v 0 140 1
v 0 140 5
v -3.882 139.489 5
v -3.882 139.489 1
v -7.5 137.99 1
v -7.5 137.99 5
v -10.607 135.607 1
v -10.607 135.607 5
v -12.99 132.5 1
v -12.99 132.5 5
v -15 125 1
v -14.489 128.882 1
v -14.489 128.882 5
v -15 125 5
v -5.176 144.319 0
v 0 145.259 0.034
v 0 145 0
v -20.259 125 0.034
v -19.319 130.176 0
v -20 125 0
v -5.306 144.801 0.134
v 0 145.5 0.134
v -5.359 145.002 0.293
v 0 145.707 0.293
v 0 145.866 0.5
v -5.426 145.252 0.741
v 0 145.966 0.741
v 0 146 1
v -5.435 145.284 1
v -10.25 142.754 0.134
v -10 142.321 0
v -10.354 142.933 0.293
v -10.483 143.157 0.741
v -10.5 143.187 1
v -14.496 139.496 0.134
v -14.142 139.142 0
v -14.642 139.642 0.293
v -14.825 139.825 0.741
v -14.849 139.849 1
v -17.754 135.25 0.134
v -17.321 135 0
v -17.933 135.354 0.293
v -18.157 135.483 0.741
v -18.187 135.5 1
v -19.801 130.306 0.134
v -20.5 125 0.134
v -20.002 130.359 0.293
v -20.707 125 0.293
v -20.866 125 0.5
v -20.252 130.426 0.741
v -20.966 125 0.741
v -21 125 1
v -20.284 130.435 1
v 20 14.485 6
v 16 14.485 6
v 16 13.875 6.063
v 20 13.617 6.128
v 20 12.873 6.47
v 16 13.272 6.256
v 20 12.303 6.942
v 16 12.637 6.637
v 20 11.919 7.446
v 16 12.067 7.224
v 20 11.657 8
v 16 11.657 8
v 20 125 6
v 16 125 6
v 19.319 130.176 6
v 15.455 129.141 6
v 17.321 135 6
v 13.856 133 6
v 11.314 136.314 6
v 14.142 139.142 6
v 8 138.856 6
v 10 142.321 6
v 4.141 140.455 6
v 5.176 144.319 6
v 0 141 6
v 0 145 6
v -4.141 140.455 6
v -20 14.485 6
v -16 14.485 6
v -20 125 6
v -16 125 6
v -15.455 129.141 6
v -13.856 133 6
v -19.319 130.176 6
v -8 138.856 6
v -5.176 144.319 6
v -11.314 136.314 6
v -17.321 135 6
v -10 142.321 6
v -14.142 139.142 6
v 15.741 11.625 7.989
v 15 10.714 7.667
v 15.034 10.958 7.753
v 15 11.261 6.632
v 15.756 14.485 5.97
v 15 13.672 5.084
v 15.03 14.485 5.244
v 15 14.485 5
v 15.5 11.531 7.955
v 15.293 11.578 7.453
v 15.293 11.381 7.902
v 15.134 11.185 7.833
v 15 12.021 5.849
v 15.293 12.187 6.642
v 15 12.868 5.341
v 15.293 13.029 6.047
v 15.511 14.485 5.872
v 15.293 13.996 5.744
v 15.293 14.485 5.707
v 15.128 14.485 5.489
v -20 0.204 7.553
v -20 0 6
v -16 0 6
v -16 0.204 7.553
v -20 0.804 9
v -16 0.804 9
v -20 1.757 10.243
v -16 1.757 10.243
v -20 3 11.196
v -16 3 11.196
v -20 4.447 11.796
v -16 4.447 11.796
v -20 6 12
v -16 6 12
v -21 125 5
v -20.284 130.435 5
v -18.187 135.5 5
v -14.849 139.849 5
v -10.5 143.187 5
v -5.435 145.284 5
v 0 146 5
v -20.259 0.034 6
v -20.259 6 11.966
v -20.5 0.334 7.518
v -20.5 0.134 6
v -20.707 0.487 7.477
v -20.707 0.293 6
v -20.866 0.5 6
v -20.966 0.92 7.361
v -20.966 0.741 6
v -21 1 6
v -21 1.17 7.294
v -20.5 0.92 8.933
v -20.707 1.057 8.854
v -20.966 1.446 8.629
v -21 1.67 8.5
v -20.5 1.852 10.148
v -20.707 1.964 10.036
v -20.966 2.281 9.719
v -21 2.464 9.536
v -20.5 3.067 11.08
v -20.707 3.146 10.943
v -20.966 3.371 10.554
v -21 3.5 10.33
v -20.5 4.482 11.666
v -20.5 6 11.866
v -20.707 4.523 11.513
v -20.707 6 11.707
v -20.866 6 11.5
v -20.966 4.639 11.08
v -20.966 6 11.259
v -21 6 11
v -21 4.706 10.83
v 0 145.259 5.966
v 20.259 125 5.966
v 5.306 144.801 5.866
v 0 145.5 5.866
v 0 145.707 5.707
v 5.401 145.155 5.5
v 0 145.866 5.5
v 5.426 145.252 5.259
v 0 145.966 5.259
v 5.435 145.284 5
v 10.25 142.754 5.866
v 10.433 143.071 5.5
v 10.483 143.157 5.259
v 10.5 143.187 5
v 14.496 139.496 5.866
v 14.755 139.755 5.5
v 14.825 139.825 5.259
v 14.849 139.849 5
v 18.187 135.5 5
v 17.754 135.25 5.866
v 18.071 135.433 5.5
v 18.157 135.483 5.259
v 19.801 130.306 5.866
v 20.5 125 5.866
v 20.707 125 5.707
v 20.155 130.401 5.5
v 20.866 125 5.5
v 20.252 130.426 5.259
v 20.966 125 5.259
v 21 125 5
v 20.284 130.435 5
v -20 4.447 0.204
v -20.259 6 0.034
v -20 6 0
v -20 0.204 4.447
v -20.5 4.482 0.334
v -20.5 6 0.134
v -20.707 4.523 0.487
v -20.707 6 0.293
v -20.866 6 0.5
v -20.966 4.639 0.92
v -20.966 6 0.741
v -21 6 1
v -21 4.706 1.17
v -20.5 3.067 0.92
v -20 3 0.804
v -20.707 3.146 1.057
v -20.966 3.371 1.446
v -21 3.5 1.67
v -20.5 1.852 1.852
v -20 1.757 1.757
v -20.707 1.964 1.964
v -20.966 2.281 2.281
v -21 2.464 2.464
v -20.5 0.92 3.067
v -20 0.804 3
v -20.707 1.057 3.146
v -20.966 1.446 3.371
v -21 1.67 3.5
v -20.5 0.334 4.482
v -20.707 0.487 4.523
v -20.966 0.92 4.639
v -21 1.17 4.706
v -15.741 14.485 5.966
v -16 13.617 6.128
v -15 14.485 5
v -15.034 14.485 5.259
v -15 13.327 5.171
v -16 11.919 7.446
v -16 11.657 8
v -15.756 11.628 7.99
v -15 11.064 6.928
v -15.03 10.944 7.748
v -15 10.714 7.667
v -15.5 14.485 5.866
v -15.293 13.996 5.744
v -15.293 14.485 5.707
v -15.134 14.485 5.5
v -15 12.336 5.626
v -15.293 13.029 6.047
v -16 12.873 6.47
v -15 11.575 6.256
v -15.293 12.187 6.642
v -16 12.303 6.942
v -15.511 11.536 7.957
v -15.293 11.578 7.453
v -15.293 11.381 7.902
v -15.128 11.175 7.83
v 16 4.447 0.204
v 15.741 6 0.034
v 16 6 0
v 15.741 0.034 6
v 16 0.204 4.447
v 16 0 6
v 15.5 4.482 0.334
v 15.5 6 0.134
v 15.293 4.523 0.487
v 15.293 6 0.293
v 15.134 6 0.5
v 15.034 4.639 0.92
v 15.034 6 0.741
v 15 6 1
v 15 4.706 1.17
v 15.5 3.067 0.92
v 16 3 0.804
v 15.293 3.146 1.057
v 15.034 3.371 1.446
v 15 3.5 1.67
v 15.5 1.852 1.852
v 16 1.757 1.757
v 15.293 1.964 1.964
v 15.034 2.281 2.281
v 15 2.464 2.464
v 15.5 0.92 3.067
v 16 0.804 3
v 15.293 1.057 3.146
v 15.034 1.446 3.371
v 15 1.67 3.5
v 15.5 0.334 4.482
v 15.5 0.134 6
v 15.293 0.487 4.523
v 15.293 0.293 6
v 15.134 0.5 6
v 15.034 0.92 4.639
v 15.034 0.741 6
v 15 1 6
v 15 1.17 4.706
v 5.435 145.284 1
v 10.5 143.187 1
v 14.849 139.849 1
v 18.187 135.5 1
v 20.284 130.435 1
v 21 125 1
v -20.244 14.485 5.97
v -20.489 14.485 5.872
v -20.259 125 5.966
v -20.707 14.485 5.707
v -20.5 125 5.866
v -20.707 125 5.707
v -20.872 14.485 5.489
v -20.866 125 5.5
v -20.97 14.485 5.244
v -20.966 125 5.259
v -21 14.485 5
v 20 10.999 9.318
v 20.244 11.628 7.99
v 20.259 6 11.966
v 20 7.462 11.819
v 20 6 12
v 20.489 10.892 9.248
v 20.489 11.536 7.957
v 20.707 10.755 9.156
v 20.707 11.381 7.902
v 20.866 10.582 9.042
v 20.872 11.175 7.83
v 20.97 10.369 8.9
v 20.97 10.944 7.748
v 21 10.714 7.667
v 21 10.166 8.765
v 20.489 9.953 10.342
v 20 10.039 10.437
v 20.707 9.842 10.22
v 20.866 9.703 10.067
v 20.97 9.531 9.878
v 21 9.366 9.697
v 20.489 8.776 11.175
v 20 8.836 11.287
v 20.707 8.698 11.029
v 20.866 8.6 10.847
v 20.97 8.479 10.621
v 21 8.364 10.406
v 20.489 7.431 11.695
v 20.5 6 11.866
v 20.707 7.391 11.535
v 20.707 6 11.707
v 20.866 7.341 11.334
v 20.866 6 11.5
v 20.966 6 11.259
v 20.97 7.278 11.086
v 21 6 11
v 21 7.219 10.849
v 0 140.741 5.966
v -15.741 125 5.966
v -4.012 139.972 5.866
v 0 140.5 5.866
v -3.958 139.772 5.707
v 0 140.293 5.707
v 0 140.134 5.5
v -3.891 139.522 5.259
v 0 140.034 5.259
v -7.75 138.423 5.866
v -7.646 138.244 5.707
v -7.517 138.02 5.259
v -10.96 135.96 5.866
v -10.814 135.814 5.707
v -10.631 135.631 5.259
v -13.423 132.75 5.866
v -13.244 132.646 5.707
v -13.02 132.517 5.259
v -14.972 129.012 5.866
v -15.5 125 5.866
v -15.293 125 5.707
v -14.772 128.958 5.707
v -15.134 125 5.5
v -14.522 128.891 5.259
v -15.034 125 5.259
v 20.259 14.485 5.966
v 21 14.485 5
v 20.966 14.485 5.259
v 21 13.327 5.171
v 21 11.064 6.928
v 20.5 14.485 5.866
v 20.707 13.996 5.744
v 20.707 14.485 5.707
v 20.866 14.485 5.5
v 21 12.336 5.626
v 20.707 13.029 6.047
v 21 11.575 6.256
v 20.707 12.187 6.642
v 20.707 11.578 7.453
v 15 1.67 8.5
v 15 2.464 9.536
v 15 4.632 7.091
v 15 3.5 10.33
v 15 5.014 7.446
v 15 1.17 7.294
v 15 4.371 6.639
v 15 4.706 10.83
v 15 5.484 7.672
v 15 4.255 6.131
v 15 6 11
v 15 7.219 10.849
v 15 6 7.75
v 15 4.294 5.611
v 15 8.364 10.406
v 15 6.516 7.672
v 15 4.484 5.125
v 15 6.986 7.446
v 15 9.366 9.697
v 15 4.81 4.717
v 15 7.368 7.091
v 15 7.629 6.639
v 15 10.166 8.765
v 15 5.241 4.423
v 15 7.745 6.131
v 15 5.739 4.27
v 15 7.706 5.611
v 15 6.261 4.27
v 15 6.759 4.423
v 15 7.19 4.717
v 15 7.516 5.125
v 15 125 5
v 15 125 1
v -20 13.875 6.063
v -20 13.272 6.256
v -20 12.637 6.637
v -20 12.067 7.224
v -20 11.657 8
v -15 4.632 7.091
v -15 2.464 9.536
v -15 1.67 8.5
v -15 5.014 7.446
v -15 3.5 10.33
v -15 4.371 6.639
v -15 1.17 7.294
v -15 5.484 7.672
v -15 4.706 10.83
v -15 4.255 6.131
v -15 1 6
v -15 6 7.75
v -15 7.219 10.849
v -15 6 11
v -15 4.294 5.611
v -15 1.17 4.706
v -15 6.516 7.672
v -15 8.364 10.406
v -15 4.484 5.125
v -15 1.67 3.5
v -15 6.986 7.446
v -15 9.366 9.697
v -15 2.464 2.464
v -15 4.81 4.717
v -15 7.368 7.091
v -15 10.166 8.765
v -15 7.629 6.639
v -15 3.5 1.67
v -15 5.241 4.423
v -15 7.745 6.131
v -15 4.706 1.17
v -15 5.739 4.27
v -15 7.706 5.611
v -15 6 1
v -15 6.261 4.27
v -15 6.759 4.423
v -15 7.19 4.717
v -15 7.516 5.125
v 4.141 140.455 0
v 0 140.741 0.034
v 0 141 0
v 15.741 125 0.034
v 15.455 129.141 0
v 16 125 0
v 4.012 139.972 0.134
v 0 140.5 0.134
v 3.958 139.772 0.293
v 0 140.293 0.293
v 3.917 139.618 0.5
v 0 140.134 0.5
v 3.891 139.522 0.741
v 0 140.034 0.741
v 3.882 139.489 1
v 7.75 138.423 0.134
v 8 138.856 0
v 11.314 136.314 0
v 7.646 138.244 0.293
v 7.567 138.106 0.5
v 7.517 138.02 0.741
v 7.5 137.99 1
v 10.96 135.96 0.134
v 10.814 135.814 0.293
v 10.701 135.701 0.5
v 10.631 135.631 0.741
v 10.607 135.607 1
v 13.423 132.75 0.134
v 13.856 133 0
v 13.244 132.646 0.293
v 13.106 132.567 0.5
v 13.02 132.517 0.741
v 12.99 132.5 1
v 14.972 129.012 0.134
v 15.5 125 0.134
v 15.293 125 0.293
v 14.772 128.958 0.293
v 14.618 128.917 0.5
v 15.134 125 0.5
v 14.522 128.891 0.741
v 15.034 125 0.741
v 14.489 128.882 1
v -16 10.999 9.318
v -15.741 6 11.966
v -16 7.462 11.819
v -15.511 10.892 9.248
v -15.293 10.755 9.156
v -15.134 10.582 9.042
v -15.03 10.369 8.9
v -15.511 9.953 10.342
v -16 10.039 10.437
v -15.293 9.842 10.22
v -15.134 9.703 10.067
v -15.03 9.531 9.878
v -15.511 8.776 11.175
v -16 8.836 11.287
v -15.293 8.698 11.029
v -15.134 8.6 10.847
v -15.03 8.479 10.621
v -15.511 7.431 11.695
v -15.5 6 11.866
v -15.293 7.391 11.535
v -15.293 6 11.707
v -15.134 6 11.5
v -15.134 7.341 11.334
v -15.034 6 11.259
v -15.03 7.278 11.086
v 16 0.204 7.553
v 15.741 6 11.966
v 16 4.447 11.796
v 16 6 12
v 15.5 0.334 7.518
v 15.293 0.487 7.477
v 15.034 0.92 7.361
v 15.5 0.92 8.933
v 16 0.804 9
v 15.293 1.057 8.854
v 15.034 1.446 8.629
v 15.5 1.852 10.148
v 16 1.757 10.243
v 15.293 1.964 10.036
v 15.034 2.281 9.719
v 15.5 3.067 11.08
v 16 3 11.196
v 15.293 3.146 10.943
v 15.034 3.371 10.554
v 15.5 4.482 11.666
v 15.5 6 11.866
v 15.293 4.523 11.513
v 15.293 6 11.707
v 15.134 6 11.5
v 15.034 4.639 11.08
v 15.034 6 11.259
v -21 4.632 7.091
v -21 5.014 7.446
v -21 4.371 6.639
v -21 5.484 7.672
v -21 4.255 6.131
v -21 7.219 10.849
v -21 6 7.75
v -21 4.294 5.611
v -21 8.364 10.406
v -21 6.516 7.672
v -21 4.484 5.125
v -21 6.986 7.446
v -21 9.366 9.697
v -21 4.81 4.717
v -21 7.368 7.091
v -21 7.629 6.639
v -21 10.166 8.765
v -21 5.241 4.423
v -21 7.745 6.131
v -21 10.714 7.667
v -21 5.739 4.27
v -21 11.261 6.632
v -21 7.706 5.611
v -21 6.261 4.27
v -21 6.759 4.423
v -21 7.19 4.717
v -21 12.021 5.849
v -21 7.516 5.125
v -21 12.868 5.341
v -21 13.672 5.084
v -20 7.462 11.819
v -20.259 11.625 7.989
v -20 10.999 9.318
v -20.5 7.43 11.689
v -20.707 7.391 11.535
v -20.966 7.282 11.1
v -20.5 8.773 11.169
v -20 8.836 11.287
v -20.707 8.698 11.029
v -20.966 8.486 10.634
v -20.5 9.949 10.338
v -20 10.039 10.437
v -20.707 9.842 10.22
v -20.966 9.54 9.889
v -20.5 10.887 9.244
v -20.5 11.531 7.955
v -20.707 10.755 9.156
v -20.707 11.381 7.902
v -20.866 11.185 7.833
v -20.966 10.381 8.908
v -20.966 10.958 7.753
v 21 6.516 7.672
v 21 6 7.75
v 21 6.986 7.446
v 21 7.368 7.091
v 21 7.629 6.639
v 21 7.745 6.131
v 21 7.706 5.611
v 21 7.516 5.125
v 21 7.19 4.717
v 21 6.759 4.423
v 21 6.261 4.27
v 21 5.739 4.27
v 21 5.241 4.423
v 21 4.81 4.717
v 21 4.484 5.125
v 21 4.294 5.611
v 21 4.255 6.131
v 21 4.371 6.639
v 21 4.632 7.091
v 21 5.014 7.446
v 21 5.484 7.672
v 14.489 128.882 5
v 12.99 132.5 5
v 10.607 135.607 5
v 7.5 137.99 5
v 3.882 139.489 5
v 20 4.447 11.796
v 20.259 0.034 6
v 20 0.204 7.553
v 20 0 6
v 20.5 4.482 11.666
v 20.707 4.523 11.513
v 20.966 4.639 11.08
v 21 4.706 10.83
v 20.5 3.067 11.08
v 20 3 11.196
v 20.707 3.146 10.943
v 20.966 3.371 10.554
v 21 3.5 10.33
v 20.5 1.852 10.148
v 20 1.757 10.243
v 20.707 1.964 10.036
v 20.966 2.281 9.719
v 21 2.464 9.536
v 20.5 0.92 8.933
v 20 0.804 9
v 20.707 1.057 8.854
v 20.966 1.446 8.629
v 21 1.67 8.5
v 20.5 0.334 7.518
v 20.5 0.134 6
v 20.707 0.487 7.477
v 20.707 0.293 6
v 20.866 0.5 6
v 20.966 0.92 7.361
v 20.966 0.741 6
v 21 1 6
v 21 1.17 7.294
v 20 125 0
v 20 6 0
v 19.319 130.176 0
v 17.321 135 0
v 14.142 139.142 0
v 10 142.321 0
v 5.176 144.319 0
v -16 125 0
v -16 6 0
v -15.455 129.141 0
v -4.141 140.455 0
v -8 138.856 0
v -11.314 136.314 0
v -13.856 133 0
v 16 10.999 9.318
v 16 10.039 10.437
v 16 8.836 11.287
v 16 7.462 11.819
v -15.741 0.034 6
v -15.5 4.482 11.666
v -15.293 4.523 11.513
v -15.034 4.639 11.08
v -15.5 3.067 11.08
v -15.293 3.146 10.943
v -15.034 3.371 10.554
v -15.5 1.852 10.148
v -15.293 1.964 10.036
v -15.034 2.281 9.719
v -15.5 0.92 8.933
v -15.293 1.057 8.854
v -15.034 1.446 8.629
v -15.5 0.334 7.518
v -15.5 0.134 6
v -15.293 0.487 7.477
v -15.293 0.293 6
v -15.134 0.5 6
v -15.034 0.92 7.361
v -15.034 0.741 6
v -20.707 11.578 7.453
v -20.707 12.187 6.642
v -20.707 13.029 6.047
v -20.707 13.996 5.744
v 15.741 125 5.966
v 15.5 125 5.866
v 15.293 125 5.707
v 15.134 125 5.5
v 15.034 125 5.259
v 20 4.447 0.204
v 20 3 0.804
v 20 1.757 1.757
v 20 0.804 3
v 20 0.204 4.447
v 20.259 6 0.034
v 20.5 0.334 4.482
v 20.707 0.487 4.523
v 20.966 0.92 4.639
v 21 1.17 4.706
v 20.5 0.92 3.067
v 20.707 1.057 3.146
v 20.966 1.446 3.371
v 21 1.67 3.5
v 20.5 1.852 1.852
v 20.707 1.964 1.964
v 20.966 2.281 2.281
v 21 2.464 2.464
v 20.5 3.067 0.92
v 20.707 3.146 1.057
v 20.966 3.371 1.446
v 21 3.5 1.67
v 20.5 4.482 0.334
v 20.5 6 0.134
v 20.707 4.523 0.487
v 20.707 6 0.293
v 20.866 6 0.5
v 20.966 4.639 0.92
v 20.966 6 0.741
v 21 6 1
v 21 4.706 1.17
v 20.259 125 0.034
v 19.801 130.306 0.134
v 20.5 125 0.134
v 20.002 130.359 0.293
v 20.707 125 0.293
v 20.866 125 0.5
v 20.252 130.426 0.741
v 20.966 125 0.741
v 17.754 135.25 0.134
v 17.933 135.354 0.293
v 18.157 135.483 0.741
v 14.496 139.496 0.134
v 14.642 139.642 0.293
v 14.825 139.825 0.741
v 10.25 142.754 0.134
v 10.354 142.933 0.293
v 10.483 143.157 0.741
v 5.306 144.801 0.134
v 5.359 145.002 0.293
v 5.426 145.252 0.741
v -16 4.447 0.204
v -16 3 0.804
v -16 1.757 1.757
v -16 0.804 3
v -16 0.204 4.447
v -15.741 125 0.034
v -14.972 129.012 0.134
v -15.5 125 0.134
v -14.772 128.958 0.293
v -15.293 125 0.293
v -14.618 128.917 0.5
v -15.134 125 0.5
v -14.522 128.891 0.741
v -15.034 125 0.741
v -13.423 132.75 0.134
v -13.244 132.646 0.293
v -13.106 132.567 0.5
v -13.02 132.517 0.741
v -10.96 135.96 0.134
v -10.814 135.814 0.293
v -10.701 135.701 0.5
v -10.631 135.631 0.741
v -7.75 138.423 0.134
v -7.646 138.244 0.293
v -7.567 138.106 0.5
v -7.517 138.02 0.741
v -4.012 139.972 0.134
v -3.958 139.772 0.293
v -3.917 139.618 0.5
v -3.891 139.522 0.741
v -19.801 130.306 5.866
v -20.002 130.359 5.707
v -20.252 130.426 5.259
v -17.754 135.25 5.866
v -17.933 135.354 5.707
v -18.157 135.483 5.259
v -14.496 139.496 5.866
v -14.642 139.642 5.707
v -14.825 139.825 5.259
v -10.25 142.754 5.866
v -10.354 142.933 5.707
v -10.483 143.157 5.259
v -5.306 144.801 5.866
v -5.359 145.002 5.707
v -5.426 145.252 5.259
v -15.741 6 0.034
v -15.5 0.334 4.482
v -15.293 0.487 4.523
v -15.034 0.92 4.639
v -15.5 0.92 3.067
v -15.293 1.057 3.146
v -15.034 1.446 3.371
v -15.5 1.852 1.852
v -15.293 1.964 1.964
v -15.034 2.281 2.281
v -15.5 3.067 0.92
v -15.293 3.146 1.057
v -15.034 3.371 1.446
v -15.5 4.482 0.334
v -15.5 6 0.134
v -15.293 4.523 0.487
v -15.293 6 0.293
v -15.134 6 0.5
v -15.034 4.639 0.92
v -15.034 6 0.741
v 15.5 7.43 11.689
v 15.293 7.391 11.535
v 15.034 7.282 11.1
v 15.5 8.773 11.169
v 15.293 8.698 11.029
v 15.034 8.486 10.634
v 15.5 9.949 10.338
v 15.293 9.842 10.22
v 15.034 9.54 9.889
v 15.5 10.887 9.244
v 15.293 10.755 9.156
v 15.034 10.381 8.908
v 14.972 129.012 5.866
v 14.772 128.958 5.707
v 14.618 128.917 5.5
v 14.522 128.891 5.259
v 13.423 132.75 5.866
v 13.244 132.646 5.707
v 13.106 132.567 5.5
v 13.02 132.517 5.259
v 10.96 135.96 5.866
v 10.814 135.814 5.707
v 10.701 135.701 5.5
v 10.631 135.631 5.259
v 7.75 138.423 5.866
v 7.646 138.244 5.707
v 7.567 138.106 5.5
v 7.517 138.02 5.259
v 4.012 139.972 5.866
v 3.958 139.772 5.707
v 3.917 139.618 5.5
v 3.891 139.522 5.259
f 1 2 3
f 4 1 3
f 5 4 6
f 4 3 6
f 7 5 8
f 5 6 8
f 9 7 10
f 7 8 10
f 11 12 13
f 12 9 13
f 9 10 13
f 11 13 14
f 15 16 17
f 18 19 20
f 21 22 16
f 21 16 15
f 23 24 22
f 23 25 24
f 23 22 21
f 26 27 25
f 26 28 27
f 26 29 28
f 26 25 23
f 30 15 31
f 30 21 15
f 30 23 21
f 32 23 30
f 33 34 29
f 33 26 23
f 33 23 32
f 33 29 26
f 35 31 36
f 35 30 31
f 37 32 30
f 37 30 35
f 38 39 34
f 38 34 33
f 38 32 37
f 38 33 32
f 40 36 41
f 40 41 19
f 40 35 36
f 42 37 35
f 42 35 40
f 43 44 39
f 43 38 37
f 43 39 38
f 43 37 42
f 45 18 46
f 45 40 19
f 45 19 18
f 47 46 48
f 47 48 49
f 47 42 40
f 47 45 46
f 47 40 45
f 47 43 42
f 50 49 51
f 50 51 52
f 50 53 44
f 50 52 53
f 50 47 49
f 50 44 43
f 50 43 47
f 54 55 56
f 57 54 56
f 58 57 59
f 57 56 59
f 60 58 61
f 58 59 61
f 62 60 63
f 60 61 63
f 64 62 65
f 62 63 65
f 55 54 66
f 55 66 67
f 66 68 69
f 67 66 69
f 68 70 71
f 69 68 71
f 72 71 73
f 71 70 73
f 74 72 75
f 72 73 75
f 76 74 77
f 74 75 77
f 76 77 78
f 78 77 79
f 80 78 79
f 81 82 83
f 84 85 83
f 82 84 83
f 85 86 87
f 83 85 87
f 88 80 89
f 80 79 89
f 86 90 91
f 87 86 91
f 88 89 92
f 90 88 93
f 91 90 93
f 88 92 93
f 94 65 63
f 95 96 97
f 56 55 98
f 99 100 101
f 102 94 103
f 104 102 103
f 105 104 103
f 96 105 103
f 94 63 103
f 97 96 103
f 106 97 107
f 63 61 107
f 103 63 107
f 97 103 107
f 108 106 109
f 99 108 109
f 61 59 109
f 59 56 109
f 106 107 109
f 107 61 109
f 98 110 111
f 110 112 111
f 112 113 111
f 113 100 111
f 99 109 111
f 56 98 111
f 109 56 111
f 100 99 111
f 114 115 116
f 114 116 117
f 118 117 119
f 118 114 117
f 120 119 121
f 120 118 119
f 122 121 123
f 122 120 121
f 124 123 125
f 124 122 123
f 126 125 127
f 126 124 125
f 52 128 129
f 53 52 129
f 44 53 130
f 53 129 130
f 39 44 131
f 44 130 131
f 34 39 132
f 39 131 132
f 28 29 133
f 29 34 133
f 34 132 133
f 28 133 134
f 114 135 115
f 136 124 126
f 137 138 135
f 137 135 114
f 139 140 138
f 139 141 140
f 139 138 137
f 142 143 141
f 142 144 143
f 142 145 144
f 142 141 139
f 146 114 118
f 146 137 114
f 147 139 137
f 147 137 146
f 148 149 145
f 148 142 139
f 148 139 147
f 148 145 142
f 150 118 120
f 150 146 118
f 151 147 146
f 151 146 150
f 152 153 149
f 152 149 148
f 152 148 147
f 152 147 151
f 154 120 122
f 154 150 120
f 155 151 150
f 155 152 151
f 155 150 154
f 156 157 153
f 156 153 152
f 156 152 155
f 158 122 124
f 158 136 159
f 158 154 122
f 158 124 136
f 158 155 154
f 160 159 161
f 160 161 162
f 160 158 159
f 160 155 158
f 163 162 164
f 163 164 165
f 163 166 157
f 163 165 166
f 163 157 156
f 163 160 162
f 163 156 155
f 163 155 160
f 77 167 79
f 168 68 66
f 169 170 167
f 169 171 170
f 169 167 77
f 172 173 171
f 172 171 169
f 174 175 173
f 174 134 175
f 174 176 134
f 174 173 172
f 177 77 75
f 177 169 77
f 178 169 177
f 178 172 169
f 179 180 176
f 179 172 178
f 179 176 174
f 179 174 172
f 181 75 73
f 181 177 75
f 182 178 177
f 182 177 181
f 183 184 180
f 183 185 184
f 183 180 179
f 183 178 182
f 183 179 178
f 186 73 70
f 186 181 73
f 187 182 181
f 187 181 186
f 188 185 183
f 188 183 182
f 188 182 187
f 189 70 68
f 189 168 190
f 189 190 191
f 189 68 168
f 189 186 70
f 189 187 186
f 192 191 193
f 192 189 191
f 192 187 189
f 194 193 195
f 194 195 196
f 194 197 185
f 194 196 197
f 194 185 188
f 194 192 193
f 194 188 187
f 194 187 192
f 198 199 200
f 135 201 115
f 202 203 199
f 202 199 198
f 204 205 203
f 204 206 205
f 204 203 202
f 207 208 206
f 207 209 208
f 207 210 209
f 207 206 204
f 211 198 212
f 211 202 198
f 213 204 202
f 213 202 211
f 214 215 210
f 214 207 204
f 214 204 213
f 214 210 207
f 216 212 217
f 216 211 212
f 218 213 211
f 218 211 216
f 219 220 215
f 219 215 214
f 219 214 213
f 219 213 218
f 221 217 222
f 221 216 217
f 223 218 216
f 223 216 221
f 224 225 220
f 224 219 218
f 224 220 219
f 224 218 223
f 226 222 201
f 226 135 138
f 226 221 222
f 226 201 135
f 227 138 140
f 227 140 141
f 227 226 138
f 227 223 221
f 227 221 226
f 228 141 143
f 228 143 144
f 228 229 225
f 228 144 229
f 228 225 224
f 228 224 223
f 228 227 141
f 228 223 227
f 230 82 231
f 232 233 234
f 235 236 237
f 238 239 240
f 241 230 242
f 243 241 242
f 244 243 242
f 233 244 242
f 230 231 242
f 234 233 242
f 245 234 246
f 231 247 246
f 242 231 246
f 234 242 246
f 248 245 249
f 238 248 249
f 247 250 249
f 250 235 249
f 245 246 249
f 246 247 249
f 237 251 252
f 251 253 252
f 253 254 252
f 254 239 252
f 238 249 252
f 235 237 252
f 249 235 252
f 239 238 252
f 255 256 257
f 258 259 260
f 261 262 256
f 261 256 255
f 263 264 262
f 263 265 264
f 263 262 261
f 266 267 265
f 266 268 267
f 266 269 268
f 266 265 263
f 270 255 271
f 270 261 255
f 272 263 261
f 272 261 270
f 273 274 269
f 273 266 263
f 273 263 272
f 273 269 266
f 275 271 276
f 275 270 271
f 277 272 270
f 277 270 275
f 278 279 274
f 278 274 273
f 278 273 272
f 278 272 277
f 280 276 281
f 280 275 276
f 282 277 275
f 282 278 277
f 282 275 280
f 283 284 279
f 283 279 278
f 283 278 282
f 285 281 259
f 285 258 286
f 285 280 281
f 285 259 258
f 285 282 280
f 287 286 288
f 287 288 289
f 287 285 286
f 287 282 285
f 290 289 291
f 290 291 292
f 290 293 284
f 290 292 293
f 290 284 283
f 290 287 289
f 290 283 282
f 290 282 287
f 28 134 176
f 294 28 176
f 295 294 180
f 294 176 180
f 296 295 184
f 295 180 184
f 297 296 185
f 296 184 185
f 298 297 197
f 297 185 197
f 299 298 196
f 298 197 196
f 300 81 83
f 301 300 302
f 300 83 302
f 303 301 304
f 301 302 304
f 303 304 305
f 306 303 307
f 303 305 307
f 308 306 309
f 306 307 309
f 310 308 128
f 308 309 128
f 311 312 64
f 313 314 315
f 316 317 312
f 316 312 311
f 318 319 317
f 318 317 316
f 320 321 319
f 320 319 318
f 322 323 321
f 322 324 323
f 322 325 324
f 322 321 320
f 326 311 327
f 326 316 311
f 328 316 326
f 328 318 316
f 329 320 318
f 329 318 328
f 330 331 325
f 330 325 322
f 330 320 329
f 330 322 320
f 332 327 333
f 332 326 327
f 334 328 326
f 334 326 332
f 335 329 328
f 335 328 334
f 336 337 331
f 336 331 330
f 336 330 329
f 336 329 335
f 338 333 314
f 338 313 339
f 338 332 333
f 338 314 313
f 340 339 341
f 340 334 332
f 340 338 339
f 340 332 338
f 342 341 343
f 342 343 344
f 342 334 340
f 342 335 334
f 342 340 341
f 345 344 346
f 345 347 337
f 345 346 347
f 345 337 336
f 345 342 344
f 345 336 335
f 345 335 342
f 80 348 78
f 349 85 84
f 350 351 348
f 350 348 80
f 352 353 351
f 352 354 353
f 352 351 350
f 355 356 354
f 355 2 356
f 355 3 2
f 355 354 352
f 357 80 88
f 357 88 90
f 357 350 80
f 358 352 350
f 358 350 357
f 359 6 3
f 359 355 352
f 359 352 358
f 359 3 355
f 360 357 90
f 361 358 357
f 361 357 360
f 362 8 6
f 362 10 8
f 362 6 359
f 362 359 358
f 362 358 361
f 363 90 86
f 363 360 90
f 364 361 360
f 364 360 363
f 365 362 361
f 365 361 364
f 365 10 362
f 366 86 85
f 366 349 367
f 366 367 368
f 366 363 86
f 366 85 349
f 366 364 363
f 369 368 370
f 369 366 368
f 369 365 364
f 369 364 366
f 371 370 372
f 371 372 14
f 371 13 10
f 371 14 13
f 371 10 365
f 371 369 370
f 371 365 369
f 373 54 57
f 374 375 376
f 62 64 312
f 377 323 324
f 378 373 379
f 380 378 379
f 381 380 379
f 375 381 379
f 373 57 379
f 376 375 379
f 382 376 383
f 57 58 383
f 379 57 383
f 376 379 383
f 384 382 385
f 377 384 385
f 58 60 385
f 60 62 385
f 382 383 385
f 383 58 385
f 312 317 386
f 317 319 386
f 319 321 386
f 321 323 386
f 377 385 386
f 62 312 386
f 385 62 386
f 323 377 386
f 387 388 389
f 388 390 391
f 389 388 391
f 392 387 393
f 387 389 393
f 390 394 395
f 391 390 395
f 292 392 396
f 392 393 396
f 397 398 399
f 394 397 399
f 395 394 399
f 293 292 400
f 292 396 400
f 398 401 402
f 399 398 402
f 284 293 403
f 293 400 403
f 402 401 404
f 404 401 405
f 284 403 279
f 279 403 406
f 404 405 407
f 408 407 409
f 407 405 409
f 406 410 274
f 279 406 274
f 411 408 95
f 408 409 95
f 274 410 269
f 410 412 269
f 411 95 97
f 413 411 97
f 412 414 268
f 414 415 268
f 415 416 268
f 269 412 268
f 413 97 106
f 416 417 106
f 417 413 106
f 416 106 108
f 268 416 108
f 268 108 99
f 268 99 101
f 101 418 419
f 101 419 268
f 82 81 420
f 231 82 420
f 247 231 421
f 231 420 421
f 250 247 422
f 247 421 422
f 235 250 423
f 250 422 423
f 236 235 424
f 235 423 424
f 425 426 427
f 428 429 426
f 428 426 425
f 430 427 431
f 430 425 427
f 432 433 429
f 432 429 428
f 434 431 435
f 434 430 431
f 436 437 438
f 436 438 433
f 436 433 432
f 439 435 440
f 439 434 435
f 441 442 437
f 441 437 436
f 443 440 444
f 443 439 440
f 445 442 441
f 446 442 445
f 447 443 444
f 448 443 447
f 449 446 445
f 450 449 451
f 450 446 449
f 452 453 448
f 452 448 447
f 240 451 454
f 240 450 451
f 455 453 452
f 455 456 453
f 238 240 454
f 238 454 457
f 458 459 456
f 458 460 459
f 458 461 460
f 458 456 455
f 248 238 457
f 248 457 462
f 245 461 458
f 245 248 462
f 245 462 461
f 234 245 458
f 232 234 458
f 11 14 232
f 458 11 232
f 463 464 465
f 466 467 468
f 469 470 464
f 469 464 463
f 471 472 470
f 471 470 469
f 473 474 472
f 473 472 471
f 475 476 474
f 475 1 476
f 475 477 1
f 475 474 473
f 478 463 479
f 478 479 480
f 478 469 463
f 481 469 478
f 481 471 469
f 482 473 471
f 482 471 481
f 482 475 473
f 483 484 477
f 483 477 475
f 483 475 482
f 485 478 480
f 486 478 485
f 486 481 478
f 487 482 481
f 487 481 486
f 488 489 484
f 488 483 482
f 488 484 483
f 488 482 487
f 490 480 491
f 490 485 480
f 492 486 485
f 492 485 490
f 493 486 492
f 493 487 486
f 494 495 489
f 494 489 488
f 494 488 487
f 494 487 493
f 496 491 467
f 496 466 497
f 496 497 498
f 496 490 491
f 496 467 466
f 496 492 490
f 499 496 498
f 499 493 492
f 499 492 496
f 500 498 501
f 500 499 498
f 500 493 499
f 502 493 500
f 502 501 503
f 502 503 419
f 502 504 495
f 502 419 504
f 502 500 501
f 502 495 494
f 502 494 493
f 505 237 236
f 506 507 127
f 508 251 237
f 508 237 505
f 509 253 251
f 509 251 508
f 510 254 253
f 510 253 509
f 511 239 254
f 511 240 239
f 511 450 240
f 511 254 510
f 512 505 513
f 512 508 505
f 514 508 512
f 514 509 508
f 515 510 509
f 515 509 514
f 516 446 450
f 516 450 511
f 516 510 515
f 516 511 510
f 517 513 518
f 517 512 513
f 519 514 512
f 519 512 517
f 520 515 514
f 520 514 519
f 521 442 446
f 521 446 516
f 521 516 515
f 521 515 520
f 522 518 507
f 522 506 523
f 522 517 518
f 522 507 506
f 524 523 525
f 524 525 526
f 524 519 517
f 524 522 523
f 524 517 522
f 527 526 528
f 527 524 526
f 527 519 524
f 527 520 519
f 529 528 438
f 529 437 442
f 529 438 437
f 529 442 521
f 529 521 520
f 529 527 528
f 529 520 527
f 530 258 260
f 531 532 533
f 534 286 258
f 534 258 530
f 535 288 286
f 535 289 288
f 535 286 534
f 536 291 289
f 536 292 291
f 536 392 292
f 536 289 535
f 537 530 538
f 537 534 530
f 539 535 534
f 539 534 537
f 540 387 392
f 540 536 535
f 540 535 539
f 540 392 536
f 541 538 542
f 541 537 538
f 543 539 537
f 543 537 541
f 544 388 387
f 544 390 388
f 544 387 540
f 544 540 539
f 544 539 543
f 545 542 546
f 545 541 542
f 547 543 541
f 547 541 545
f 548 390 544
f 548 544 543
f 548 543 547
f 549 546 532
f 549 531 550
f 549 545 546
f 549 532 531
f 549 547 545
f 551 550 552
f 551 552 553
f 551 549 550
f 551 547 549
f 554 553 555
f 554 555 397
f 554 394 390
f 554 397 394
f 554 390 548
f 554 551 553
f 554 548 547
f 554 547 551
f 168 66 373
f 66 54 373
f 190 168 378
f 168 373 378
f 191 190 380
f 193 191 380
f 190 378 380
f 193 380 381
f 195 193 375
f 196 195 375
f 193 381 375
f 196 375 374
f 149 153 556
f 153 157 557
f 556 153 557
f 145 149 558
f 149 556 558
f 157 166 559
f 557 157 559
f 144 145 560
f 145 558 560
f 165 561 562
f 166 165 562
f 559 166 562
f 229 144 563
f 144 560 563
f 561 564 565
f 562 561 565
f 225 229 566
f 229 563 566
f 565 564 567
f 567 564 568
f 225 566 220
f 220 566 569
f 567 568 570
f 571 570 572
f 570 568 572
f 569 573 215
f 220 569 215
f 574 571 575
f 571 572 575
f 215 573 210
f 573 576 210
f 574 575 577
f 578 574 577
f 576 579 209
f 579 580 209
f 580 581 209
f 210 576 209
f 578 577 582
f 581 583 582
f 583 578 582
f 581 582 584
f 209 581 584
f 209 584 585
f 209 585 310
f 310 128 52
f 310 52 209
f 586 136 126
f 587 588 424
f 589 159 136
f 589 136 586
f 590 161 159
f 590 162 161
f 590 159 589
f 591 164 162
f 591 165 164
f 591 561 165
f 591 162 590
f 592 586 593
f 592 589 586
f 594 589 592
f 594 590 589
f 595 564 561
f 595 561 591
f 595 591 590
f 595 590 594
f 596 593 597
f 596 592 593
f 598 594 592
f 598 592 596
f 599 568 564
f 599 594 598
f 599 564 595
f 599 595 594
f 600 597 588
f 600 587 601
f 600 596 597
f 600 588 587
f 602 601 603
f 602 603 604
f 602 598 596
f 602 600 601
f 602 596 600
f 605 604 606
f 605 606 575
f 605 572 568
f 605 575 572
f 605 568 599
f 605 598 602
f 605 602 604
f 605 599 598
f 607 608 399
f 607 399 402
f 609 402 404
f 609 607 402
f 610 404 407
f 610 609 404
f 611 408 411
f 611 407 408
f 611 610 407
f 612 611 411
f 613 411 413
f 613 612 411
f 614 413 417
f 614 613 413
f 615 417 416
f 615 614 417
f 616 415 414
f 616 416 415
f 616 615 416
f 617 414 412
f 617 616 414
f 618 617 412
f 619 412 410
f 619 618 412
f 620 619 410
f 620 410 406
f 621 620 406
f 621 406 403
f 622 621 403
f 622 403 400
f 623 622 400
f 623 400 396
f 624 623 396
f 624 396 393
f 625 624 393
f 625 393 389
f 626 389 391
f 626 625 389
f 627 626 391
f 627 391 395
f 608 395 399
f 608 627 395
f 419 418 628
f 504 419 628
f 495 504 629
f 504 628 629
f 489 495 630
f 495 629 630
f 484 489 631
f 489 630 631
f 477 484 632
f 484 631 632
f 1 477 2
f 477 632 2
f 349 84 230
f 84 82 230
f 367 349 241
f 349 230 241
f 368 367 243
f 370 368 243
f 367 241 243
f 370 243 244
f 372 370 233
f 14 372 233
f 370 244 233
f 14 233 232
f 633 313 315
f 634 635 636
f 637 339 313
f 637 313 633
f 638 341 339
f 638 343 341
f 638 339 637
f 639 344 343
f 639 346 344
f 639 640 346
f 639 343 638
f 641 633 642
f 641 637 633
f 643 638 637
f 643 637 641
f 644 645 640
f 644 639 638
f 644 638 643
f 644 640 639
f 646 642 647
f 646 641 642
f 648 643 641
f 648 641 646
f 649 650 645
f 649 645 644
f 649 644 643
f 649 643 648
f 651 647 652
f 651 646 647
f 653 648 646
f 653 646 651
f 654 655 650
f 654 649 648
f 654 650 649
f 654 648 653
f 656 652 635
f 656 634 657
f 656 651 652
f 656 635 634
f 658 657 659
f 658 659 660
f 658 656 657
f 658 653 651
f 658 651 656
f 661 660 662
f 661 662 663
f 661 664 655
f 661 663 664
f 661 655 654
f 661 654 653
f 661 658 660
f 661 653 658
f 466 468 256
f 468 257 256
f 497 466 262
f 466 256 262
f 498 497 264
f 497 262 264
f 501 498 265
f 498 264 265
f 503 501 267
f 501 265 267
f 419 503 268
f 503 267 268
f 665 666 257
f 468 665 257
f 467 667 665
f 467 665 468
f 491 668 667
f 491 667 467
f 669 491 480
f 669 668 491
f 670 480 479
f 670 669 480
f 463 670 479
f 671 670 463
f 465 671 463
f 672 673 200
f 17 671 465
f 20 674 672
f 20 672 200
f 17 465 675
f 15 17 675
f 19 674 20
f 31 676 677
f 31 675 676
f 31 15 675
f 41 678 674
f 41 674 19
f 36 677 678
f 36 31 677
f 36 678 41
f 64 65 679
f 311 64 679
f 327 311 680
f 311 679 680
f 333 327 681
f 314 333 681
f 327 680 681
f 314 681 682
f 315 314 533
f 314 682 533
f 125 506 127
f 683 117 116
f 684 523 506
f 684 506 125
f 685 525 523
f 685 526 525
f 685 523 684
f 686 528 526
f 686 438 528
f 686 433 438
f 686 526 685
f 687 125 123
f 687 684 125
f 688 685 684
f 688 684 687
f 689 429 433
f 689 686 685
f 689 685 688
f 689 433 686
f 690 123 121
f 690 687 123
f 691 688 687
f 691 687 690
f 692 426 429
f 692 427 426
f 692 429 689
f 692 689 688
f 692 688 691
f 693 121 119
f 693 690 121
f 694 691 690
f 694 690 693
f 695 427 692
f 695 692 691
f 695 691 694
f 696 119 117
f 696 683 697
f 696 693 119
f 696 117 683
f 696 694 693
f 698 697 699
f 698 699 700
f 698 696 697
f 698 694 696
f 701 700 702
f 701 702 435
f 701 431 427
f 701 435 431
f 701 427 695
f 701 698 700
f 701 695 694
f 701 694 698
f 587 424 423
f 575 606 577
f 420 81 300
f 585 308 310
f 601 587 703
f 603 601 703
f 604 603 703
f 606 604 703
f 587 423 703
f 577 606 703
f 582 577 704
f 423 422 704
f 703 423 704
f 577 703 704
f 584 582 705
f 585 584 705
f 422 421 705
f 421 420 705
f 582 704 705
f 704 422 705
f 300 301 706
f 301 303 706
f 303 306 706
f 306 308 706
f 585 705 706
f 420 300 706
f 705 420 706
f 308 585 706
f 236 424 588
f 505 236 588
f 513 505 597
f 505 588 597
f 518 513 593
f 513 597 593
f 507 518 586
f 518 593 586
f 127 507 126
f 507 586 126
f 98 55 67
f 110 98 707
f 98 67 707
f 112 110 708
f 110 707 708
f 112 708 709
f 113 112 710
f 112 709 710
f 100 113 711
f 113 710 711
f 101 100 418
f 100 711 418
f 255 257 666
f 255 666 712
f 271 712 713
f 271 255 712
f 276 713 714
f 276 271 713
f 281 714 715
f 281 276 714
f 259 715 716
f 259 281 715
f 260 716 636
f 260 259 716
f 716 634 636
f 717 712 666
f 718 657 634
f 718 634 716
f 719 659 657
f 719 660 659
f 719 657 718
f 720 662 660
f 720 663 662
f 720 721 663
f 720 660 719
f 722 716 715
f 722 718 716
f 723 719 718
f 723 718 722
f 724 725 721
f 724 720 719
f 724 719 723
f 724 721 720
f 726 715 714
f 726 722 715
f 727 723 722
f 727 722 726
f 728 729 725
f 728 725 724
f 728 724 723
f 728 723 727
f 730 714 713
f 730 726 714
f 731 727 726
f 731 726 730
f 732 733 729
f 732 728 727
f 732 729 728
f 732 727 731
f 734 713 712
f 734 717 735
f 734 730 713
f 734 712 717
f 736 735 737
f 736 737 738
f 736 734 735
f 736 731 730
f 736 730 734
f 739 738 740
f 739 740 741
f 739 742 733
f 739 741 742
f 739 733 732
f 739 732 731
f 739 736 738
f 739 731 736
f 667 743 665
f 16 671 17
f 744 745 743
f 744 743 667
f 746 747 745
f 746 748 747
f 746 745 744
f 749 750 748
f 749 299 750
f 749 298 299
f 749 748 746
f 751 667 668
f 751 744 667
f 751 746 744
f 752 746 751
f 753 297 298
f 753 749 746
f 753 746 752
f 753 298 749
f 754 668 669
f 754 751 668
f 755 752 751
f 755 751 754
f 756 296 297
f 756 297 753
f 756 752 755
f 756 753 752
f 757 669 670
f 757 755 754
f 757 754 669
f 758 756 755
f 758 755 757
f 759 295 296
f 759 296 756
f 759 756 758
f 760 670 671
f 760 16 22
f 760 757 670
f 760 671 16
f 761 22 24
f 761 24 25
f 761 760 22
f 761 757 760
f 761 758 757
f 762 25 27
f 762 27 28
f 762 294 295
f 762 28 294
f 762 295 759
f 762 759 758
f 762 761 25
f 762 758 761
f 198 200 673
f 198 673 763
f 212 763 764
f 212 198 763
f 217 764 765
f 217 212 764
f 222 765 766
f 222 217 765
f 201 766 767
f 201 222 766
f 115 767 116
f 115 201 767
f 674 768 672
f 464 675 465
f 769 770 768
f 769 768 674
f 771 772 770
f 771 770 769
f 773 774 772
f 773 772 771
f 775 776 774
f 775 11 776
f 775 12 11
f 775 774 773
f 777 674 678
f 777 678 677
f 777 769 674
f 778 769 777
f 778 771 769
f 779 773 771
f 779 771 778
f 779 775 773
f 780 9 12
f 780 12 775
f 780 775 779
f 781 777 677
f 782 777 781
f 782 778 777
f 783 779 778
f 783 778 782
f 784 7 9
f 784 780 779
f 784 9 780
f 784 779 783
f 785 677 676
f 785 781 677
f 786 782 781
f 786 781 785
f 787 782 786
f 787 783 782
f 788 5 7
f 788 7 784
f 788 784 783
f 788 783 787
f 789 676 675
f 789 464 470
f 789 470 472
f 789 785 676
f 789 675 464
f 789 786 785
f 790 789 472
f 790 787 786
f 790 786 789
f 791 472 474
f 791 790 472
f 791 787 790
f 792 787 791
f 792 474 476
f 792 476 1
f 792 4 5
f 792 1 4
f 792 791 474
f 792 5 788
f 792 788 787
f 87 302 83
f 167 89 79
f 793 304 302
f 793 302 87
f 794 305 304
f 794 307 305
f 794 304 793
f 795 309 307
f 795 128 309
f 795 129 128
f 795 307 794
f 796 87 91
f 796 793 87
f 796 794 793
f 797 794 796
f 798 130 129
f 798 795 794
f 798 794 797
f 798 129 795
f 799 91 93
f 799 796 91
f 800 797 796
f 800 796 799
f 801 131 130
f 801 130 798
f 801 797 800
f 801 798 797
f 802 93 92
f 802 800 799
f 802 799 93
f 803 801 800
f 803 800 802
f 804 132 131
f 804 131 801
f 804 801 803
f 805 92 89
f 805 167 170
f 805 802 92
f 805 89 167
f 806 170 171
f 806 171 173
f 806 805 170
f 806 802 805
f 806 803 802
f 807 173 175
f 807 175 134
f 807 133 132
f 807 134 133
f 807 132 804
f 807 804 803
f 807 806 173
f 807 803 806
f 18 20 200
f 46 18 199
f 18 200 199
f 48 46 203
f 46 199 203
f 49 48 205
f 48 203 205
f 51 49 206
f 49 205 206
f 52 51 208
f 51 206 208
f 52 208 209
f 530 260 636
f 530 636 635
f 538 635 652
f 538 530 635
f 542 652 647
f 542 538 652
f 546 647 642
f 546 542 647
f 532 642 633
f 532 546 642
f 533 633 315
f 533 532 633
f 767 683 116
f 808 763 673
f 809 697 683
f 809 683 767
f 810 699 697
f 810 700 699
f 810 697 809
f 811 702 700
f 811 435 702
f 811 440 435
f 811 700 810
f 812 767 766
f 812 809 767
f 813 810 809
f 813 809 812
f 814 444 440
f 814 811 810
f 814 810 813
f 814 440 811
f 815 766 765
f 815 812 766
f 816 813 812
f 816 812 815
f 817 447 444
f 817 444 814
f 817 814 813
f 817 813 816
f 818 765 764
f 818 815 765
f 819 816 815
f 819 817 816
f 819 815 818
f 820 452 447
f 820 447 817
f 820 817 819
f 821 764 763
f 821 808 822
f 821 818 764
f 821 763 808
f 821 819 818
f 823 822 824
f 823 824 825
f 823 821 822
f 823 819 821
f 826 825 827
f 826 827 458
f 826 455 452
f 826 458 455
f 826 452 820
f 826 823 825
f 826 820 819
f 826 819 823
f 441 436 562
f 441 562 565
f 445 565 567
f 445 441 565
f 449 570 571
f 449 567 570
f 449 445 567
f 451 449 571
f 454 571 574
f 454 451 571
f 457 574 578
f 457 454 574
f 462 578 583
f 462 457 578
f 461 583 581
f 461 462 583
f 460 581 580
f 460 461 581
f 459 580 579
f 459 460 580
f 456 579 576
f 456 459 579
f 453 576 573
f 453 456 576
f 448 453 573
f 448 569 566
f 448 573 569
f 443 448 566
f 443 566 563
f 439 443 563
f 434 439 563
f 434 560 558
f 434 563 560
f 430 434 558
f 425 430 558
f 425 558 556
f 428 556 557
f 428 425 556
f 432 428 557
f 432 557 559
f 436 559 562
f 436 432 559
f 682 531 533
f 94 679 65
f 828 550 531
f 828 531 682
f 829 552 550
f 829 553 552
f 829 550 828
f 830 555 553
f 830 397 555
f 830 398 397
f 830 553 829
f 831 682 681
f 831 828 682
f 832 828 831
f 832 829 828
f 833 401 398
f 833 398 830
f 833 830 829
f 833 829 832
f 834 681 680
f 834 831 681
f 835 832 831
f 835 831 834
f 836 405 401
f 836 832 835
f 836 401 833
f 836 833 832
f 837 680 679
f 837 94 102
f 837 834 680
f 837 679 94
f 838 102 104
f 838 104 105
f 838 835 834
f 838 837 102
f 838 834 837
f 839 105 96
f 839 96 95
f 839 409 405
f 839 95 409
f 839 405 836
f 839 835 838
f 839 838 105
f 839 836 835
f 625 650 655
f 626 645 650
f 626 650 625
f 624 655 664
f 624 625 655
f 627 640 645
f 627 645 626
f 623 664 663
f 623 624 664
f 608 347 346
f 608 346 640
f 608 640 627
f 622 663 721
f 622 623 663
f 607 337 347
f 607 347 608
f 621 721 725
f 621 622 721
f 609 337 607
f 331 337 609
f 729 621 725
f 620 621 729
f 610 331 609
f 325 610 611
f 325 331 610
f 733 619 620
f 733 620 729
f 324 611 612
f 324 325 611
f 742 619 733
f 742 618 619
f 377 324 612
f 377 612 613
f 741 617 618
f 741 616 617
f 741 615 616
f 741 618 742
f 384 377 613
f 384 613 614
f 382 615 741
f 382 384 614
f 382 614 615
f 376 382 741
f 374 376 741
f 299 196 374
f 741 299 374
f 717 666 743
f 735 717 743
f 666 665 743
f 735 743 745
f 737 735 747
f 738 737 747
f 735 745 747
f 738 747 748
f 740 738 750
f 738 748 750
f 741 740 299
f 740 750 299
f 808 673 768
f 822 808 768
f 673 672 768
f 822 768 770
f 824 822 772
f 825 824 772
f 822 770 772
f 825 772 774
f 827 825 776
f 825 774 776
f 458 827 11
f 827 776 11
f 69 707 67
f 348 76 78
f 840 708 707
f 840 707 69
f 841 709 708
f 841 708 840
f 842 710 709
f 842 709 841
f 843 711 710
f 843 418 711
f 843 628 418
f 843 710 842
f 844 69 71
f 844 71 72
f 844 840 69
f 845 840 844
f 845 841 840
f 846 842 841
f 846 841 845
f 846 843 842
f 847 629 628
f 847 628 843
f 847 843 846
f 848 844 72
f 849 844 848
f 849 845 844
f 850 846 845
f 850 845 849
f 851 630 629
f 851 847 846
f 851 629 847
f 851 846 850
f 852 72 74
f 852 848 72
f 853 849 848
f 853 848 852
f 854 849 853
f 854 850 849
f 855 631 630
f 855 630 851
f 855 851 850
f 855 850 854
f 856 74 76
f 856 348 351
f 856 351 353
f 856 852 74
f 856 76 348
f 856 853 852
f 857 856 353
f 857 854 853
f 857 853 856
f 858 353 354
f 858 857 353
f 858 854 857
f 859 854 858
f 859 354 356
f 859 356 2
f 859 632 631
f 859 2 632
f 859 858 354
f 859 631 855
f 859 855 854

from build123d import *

# Parameters (mm, degrees)
BOSS_EXTRU_1_DEPTH           = 6
ESQUISSE2_W                  = 6
ESQUISSE2_H                  = 12
BOSS_EXTRU_2_DEPTH           = 6
BOSS_EXTRU_3_START           = -36
ESQUISSE2_2_W                = 6
ESQUISSE2_2_H                = 12
BOSS_EXTRU_3_DEPTH           = 6
CONG_1_R                     = 15
CONG_2_R                     = 21
ENL_V_MAT_EXTRU_1_DEPTH      = 153.394225612
ENL_V_MAT_EXTRU_1_DEPTH_BACK = 153.394225612
ESQUISSE3_R                  = 1.75
CONG_4_R                     = 6
CONG_5_R                     = 3
CONG_6_R                     = 1


with BuildPart() as part:
    # Esquisse1 → Boss.-Extru.1 (new body)
    with BuildSketch(Plane.XY):
        Polygon((15, 0), (15, 140), (-15, 140), (-15, 0), (-21, 0), (-21, 146), (21, 146), (21, 0), align=None)
    extrude(amount=BOSS_EXTRU_1_DEPTH)

    # Esquisse2 → Boss.-Extru.2 (add)
    with BuildSketch(Plane(origin=(21, 0, 0), x_dir=(0, 0, -1), z_dir=(1, 0, 0))):
        with Locations((-9, 6)):
            Rectangle(ESQUISSE2_W, ESQUISSE2_H)
    extrude(amount=-BOSS_EXTRU_2_DEPTH)

    # Esquisse2<2> → Boss.-Extru.3 (add)
    with BuildSketch(Plane(origin=(21, 0, 0), x_dir=(0, 0, -1), z_dir=(1, 0, 0)).offset(BOSS_EXTRU_3_START)):
        with Locations((-9, 6)):
            Rectangle(ESQUISSE2_2_W, ESQUISSE2_2_H)
    extrude(amount=-BOSS_EXTRU_3_DEPTH)

    # Congé1
    cong_1_edges = [part.edges().sort_by_distance(p)[0] for p in [
        (15, 140, 3),
        (-15, 140, 3),
    ]]
    fillet(cong_1_edges, radius=CONG_1_R - 0.0001)  # a hair under: the kernel refuses the full size

    # Congé2
    cong_2_edges = [part.edges().sort_by_distance(p)[0] for p in [
        (21, 146, 3),
        (-21, 146, 3),
    ]]
    fillet(cong_2_edges, radius=CONG_2_R - 0.0001)  # a hair under: the kernel refuses the full size

    # Esquisse3 → Enlèv. mat.-Extru.1 (cut, two sides: drawn at the far end of the back side and taken through both)
    with BuildSketch(Plane.ZY.offset(21).offset(-ENL_V_MAT_EXTRU_1_DEPTH_BACK)):
        with Locations((6, 6)):
            Circle(ESQUISSE3_R)
    extrude(amount=ENL_V_MAT_EXTRU_1_DEPTH + ENL_V_MAT_EXTRU_1_DEPTH_BACK, mode=Mode.SUBTRACT)

    # Congé4
    cong_4_edges = [part.edges().sort_by_distance(p)[0] for p in [
        (18, 0, 0),
        (-18, 0, 0),
        (18, 0, 12),
        (-18, 0, 12),
        (18, 12, 12),
        (-18, 12, 12),
    ]]
    fillet(cong_4_edges, radius=CONG_4_R - 0.0001)  # a hair under: the kernel refuses the full size

    # Congé5
    cong_5_edges = [part.edges().sort_by_distance(p)[0] for p in [
        (18, 12, 6),
        (-18, 12, 6),
    ]]
    fillet(cong_5_edges, radius=CONG_5_R)

    # Congé6
    cong_6_edges = [part.edges().sort_by_distance(p)[0] for p in [
        (21, 69.742705332, 6),
        (-15, 69.742705332, 6),
        (21, 9.464163125, 10.898984228),
        (-15, 9.464163125, 10.898984228),
        (21, 12.753250233, 6.550517061),
        (15, 12.753250233, 6.550517061),
        (-15, 12.753250233, 6.550517061),
        (-21, 12.753250233, 6.550517061),
        (15, 65.5, 0),
        (15, 69.742705332, 6),
        (10.606631007, 135.606631007, 0),
        (10.606631007, 135.606631007, 6),
        (-10.606631007, 135.606631007, 0),
        (-10.606631007, 135.606631007, 6),
        (-21, 65.5, 0),
        (-14.849271694, 139.849271694, 0),
        (14.849271694, 139.849271694, 0),
        (-21, 69.742705332, 6),
        (-14.849271694, 139.849271694, 6),
        (14.849271694, 139.849271694, 6),
        (21, 65.5, 0),
        (21, 1.757330024, 1.757330024),
        (21, 1.757330024, 10.242669976),
        (15, 1.757330024, 1.757330024),
        (15, 1.757330024, 10.242669976),
        (15, 9.464163125, 10.898984228),
        (-15, 65.5, 0),
        (-15, 1.757330024, 1.757330024),
        (-15, 1.757330024, 10.242669976),
        (-21, 1.757330024, 1.757330024),
        (-21, 1.757330024, 10.242669976),
        (-21, 9.464163125, 10.898984228),
    ]]
    fillet(cong_6_edges, radius=CONG_6_R)


solid = part.part
